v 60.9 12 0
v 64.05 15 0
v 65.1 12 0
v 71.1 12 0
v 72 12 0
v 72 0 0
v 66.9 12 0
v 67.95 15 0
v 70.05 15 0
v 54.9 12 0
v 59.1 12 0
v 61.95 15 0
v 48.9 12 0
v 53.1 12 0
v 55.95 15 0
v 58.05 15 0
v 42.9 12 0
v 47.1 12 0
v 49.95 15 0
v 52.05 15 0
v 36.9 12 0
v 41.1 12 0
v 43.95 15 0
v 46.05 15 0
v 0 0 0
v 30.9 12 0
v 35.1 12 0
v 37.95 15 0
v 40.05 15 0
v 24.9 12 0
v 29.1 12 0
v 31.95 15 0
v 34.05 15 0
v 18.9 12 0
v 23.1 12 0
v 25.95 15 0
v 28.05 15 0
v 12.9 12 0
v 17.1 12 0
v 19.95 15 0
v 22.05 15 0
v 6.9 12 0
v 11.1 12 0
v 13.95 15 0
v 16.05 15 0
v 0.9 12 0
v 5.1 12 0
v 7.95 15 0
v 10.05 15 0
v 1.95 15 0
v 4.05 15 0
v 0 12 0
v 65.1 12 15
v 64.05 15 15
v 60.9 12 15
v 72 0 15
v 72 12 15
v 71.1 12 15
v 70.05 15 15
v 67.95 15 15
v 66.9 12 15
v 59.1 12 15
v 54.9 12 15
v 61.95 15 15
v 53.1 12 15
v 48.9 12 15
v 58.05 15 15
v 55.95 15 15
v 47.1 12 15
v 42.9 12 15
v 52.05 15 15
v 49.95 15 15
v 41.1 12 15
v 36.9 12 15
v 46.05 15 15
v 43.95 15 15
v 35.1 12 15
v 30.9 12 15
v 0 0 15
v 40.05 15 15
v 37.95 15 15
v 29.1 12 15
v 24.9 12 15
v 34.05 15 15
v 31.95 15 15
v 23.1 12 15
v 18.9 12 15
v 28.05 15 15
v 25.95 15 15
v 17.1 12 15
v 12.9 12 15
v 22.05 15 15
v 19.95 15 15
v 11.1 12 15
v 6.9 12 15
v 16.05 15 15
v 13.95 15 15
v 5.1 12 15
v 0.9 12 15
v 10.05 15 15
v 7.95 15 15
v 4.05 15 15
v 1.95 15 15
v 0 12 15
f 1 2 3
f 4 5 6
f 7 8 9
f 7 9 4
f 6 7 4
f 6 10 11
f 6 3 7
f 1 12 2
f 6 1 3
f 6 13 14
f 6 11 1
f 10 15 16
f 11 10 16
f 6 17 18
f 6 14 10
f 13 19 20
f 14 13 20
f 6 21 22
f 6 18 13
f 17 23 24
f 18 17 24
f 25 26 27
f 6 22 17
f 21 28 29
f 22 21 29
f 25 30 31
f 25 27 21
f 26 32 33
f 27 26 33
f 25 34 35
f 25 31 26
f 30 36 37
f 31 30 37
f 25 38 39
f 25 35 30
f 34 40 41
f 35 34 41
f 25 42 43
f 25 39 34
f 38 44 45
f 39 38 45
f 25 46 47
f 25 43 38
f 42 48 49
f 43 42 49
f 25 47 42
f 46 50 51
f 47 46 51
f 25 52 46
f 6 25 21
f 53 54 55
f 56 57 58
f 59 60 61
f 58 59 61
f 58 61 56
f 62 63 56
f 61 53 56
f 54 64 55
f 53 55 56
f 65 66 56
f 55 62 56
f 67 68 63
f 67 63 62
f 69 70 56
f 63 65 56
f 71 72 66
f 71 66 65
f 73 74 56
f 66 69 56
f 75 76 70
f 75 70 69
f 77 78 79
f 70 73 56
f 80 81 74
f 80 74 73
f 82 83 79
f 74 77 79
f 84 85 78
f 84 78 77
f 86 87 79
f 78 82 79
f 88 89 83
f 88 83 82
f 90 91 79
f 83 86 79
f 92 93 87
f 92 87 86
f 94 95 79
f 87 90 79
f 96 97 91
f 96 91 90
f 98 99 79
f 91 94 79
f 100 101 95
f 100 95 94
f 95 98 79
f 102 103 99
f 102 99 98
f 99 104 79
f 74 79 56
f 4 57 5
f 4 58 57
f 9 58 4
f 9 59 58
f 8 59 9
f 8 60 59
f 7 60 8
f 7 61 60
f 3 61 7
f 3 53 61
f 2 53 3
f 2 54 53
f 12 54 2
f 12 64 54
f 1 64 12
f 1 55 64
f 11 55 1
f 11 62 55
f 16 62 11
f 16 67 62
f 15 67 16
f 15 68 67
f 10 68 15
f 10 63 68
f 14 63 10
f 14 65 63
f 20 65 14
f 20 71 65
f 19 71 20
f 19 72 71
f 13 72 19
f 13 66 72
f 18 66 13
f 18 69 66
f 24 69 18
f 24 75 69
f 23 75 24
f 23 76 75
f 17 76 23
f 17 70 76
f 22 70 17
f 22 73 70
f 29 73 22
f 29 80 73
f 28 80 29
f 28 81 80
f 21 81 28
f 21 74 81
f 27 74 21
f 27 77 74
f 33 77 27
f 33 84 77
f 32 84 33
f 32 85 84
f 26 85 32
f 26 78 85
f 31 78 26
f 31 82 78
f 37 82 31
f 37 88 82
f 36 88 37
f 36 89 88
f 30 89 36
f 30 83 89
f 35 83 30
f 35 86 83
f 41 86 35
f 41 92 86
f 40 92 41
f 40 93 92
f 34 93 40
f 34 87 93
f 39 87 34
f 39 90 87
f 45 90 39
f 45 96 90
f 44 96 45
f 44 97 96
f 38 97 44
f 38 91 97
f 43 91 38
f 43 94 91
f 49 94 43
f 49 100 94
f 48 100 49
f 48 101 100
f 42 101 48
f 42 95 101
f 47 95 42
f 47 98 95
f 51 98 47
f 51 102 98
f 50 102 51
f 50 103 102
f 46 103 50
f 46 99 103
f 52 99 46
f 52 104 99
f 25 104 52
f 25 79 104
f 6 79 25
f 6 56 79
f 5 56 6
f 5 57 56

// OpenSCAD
$fn = 32;

// ----------------------------------------------------------------------
// Gear rack: 12 teeth, pitch 6 mm
// ----------------------------------------------------------------------

// --- parameters (mm) ---
teeth = 12;               // number of teeth
pitch = 6;                // tooth pitch, X
root_w = 4.2;             // tooth width at the root
tip_w = 2.1;              // tooth width at the tip
base_h = 12;              // rack body height, Y
tooth_h = 3;              // tooth height above the body
plate_t = 15;             // rack width, Z (extrusion height)

rack_l = teeth * pitch;  // overall length
total_h = base_h + tooth_h;  // overall height

profile = [[0, 0], [72, 0], [72, 12], [71.1, 12], [70.05, 15], [67.95, 15], [66.9, 12], [65.1, 12], [64.05, 15], [61.95, 15], [60.9, 12], [59.1, 12], [58.05, 15], [55.95, 15], [54.9, 12], [53.1, 12], [52.05, 15], [49.95, 15], [48.9, 12], [47.1, 12], [46.05, 15], [43.95, 15], [42.9, 12], [41.1, 12], [40.05, 15], [37.95, 15], [36.9, 12], [35.1, 12], [34.05, 15], [31.95, 15], [30.9, 12], [29.1, 12], [28.05, 15], [25.95, 15], [24.9, 12], [23.1, 12], [22.05, 15], [19.95, 15], [18.9, 12], [17.1, 12], [16.05, 15], [13.95, 15], [12.9, 12], [11.1, 12], [10.05, 15], [7.95, 15], [6.9, 12], [5.1, 12], [4.05, 15], [1.95, 15], [0.9, 12], [0, 12]];  // primary outline, 52 points, counter clockwise

// --- the one profile operation ---
linear_extrude(height = plate_t) polygon(points = profile);
